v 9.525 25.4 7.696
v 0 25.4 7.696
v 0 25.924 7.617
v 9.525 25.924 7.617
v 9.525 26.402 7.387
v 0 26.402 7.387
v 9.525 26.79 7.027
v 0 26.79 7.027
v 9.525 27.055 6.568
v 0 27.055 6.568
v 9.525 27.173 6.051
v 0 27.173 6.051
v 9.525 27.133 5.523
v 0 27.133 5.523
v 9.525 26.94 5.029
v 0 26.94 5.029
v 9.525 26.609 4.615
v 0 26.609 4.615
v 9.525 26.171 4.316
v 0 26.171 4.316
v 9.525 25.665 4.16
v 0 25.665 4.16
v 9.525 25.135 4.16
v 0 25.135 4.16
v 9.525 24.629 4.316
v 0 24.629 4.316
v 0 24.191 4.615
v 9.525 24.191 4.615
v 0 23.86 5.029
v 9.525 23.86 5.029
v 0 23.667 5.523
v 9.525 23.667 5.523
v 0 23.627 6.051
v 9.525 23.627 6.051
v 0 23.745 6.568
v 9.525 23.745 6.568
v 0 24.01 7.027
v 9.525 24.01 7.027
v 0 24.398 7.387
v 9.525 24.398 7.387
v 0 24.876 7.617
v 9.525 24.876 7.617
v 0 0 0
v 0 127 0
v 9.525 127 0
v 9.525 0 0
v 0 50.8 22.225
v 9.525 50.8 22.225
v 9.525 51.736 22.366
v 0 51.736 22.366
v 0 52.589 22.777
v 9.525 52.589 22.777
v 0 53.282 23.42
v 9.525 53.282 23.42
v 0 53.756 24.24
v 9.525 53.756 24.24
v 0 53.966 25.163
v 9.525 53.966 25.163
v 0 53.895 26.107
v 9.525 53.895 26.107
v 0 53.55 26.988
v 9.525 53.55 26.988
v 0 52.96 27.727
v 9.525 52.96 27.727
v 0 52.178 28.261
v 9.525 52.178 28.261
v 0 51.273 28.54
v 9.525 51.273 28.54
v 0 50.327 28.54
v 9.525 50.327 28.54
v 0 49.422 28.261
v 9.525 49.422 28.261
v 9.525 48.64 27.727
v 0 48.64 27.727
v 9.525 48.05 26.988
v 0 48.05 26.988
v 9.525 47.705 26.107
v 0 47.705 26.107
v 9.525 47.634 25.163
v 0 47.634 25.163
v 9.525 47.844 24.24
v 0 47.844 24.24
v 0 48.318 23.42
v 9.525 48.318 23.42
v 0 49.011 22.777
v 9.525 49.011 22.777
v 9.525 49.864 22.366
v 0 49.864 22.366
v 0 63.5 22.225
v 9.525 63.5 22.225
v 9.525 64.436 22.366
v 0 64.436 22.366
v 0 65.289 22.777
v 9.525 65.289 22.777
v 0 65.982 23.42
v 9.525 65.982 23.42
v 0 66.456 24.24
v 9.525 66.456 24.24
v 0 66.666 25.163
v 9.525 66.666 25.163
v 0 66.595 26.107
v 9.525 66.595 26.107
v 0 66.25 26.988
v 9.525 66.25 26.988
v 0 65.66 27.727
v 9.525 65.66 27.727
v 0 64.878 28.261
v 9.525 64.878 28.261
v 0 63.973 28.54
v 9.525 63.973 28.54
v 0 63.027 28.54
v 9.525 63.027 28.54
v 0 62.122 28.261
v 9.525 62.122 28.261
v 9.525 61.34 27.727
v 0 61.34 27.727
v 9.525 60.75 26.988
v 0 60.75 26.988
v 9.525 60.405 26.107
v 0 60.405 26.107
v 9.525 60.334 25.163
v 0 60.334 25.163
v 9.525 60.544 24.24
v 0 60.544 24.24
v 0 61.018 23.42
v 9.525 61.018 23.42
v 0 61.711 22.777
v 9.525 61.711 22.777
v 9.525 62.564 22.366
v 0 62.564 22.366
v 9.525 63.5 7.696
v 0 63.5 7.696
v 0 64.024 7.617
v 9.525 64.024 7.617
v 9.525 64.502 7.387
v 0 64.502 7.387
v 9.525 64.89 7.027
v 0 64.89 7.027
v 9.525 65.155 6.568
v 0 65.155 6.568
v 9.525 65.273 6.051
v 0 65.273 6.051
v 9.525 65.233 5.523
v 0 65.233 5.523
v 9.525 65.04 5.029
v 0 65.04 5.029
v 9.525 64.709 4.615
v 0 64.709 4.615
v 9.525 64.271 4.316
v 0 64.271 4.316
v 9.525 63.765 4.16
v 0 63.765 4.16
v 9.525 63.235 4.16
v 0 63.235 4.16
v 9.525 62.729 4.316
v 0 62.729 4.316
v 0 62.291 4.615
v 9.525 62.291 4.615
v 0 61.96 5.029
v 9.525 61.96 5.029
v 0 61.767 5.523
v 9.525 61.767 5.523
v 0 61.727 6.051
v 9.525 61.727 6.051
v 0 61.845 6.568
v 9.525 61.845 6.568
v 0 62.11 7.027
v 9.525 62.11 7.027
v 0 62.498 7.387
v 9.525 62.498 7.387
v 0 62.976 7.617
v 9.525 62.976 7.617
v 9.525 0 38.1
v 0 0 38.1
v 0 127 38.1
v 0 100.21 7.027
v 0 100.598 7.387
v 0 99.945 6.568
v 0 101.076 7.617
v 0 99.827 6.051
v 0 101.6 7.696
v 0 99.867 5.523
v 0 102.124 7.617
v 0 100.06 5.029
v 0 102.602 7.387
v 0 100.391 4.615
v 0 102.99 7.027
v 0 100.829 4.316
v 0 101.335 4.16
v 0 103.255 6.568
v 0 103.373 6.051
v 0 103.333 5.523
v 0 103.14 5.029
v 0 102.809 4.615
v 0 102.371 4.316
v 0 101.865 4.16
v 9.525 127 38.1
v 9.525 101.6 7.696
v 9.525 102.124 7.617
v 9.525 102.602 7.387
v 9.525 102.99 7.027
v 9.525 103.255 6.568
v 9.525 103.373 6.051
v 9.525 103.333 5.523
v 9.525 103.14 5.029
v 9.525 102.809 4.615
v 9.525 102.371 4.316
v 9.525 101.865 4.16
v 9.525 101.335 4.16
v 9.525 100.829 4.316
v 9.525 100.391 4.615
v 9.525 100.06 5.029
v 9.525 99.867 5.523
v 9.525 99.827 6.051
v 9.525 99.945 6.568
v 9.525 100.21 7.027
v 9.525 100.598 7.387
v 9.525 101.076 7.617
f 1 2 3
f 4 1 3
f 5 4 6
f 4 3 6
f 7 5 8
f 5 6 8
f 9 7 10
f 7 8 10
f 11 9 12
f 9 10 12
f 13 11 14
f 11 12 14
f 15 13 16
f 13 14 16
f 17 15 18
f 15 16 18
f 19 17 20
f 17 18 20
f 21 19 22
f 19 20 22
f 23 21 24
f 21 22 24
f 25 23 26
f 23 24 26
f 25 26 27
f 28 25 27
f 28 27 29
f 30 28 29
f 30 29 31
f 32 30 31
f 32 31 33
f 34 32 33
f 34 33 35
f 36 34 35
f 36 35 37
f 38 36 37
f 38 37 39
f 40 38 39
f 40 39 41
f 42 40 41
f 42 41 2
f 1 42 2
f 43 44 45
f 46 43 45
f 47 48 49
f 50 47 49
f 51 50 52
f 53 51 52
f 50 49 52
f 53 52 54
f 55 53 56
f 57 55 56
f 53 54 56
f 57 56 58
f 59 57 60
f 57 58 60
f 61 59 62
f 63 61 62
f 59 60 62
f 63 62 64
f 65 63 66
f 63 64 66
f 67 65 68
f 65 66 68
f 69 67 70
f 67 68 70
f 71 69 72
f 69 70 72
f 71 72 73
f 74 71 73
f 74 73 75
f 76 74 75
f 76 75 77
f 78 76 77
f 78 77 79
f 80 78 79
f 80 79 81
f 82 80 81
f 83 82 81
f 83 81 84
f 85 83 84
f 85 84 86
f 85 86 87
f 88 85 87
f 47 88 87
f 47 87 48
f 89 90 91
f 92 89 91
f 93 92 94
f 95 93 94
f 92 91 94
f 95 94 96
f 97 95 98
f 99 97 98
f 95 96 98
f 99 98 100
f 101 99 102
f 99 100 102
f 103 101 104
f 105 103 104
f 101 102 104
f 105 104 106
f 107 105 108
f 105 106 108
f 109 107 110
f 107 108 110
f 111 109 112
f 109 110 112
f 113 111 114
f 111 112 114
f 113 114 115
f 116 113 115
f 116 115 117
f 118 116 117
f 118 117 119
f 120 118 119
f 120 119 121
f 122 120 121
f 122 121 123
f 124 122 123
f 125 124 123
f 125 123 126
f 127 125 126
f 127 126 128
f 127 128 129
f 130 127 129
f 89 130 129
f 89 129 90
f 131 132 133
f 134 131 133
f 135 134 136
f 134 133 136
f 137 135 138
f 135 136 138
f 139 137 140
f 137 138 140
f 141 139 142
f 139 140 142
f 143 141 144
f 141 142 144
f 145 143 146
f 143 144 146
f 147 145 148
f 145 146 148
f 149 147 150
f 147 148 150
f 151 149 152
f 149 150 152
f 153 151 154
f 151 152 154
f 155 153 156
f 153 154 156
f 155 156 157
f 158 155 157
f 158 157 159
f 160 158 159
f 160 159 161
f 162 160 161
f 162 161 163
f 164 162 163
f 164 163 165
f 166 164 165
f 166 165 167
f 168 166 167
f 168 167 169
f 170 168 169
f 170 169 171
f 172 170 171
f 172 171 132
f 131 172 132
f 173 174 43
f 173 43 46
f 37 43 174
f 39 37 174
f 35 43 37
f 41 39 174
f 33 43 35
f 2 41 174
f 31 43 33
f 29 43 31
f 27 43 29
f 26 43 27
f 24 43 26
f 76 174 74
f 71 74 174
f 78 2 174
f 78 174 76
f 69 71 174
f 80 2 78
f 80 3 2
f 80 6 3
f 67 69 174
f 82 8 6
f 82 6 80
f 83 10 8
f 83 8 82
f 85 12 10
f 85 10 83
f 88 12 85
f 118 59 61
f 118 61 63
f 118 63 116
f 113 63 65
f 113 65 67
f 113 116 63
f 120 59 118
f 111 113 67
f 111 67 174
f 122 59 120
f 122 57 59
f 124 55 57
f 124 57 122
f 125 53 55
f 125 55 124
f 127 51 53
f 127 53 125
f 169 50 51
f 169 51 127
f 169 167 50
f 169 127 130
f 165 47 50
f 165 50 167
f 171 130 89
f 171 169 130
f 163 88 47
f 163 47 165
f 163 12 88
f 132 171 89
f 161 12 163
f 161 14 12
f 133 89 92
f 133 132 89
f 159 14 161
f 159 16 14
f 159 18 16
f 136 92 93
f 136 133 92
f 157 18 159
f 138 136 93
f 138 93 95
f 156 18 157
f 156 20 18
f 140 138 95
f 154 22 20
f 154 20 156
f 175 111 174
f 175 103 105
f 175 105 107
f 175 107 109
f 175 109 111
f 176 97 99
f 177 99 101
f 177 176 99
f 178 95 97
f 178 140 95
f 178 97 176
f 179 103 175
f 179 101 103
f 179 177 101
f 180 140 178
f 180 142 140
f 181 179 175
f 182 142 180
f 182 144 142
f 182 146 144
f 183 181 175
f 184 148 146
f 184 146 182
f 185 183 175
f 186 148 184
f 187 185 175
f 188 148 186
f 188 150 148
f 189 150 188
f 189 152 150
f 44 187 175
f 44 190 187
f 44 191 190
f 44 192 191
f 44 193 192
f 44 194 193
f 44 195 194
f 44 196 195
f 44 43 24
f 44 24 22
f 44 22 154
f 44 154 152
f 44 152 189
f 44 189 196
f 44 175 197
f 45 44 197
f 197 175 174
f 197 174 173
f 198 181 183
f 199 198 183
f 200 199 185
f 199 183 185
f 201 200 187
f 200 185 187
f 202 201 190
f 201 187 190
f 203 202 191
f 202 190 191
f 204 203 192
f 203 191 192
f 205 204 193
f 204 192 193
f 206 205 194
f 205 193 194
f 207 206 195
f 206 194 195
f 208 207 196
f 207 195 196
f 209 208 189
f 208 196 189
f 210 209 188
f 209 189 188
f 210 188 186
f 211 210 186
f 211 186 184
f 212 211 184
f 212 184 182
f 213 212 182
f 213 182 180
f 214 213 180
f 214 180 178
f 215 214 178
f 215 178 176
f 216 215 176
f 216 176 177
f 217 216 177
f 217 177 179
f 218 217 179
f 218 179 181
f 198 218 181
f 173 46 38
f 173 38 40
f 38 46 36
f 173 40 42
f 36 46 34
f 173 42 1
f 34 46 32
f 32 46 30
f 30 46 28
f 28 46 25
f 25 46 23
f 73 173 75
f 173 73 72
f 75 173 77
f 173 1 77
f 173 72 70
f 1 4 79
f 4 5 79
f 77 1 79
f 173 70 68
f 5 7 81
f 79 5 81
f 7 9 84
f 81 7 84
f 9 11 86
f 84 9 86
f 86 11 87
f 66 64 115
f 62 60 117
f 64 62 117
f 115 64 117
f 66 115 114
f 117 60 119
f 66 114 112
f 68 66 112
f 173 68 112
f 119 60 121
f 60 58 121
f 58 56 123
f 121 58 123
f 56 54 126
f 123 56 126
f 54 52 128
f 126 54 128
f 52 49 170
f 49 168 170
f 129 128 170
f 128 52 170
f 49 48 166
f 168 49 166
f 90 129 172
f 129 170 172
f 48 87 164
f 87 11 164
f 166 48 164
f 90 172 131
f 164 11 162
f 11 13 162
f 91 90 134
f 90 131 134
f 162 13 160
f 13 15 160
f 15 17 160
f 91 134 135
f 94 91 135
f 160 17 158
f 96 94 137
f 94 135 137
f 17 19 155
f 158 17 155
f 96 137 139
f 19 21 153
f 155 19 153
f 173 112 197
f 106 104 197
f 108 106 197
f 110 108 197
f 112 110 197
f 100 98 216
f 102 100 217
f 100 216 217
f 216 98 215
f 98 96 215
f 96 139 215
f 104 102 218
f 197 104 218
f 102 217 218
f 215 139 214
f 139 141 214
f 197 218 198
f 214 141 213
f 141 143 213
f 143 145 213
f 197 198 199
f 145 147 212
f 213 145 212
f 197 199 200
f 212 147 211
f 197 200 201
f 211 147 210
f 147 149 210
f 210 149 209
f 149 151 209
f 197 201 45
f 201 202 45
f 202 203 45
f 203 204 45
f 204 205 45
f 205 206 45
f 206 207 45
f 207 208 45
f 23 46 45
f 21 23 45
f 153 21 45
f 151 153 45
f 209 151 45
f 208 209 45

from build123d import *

# Parameters (mm, degrees)
SKETCH1_W           = 9.525
SKETCH1_H           = 127
BOSS_EXTRUDE1_DEPTH = 38.1
SKETCH2_R           = 1.778
CUT_EXTRUDE1_DEPTH  = 10.525
SKETCH3_R           = 3.175
CUT_EXTRUDE2_DEPTH  = 38.1


with BuildPart() as part:
    # Sketch1 → Boss-Extrude1 (new body)
    with BuildSketch(Plane.XY):
        with Locations((4.7625, 63.5)):
            Rectangle(SKETCH1_W, SKETCH1_H)
    extrude(amount=BOSS_EXTRUDE1_DEPTH)

    # Sketch2 → Cut-Extrude1 (cut, through all)
    with BuildSketch(Plane.ZY):
        with Locations((5.9182, 101.6)):
            Circle(SKETCH2_R)
        with Locations((5.9182, 63.5)):
            Circle(SKETCH2_R)
        with Locations((5.9182, 25.4)):
            Circle(SKETCH2_R)
    extrude(amount=-CUT_EXTRUDE1_DEPTH, mode=Mode.SUBTRACT)

    # Sketch3 → Cut-Extrude2 (cut)
    with BuildSketch(Plane(origin=(9.525, 0, 0), x_dir=(0, 0, -1), z_dir=(1, 0, 0))):
        with Locations((-25.4, 63.5)):
            Circle(SKETCH3_R)
        with Locations((-25.4, 50.8)):
            Circle(SKETCH3_R)
    extrude(amount=-CUT_EXTRUDE2_DEPTH, mode=Mode.SUBTRACT)


solid = part.part
